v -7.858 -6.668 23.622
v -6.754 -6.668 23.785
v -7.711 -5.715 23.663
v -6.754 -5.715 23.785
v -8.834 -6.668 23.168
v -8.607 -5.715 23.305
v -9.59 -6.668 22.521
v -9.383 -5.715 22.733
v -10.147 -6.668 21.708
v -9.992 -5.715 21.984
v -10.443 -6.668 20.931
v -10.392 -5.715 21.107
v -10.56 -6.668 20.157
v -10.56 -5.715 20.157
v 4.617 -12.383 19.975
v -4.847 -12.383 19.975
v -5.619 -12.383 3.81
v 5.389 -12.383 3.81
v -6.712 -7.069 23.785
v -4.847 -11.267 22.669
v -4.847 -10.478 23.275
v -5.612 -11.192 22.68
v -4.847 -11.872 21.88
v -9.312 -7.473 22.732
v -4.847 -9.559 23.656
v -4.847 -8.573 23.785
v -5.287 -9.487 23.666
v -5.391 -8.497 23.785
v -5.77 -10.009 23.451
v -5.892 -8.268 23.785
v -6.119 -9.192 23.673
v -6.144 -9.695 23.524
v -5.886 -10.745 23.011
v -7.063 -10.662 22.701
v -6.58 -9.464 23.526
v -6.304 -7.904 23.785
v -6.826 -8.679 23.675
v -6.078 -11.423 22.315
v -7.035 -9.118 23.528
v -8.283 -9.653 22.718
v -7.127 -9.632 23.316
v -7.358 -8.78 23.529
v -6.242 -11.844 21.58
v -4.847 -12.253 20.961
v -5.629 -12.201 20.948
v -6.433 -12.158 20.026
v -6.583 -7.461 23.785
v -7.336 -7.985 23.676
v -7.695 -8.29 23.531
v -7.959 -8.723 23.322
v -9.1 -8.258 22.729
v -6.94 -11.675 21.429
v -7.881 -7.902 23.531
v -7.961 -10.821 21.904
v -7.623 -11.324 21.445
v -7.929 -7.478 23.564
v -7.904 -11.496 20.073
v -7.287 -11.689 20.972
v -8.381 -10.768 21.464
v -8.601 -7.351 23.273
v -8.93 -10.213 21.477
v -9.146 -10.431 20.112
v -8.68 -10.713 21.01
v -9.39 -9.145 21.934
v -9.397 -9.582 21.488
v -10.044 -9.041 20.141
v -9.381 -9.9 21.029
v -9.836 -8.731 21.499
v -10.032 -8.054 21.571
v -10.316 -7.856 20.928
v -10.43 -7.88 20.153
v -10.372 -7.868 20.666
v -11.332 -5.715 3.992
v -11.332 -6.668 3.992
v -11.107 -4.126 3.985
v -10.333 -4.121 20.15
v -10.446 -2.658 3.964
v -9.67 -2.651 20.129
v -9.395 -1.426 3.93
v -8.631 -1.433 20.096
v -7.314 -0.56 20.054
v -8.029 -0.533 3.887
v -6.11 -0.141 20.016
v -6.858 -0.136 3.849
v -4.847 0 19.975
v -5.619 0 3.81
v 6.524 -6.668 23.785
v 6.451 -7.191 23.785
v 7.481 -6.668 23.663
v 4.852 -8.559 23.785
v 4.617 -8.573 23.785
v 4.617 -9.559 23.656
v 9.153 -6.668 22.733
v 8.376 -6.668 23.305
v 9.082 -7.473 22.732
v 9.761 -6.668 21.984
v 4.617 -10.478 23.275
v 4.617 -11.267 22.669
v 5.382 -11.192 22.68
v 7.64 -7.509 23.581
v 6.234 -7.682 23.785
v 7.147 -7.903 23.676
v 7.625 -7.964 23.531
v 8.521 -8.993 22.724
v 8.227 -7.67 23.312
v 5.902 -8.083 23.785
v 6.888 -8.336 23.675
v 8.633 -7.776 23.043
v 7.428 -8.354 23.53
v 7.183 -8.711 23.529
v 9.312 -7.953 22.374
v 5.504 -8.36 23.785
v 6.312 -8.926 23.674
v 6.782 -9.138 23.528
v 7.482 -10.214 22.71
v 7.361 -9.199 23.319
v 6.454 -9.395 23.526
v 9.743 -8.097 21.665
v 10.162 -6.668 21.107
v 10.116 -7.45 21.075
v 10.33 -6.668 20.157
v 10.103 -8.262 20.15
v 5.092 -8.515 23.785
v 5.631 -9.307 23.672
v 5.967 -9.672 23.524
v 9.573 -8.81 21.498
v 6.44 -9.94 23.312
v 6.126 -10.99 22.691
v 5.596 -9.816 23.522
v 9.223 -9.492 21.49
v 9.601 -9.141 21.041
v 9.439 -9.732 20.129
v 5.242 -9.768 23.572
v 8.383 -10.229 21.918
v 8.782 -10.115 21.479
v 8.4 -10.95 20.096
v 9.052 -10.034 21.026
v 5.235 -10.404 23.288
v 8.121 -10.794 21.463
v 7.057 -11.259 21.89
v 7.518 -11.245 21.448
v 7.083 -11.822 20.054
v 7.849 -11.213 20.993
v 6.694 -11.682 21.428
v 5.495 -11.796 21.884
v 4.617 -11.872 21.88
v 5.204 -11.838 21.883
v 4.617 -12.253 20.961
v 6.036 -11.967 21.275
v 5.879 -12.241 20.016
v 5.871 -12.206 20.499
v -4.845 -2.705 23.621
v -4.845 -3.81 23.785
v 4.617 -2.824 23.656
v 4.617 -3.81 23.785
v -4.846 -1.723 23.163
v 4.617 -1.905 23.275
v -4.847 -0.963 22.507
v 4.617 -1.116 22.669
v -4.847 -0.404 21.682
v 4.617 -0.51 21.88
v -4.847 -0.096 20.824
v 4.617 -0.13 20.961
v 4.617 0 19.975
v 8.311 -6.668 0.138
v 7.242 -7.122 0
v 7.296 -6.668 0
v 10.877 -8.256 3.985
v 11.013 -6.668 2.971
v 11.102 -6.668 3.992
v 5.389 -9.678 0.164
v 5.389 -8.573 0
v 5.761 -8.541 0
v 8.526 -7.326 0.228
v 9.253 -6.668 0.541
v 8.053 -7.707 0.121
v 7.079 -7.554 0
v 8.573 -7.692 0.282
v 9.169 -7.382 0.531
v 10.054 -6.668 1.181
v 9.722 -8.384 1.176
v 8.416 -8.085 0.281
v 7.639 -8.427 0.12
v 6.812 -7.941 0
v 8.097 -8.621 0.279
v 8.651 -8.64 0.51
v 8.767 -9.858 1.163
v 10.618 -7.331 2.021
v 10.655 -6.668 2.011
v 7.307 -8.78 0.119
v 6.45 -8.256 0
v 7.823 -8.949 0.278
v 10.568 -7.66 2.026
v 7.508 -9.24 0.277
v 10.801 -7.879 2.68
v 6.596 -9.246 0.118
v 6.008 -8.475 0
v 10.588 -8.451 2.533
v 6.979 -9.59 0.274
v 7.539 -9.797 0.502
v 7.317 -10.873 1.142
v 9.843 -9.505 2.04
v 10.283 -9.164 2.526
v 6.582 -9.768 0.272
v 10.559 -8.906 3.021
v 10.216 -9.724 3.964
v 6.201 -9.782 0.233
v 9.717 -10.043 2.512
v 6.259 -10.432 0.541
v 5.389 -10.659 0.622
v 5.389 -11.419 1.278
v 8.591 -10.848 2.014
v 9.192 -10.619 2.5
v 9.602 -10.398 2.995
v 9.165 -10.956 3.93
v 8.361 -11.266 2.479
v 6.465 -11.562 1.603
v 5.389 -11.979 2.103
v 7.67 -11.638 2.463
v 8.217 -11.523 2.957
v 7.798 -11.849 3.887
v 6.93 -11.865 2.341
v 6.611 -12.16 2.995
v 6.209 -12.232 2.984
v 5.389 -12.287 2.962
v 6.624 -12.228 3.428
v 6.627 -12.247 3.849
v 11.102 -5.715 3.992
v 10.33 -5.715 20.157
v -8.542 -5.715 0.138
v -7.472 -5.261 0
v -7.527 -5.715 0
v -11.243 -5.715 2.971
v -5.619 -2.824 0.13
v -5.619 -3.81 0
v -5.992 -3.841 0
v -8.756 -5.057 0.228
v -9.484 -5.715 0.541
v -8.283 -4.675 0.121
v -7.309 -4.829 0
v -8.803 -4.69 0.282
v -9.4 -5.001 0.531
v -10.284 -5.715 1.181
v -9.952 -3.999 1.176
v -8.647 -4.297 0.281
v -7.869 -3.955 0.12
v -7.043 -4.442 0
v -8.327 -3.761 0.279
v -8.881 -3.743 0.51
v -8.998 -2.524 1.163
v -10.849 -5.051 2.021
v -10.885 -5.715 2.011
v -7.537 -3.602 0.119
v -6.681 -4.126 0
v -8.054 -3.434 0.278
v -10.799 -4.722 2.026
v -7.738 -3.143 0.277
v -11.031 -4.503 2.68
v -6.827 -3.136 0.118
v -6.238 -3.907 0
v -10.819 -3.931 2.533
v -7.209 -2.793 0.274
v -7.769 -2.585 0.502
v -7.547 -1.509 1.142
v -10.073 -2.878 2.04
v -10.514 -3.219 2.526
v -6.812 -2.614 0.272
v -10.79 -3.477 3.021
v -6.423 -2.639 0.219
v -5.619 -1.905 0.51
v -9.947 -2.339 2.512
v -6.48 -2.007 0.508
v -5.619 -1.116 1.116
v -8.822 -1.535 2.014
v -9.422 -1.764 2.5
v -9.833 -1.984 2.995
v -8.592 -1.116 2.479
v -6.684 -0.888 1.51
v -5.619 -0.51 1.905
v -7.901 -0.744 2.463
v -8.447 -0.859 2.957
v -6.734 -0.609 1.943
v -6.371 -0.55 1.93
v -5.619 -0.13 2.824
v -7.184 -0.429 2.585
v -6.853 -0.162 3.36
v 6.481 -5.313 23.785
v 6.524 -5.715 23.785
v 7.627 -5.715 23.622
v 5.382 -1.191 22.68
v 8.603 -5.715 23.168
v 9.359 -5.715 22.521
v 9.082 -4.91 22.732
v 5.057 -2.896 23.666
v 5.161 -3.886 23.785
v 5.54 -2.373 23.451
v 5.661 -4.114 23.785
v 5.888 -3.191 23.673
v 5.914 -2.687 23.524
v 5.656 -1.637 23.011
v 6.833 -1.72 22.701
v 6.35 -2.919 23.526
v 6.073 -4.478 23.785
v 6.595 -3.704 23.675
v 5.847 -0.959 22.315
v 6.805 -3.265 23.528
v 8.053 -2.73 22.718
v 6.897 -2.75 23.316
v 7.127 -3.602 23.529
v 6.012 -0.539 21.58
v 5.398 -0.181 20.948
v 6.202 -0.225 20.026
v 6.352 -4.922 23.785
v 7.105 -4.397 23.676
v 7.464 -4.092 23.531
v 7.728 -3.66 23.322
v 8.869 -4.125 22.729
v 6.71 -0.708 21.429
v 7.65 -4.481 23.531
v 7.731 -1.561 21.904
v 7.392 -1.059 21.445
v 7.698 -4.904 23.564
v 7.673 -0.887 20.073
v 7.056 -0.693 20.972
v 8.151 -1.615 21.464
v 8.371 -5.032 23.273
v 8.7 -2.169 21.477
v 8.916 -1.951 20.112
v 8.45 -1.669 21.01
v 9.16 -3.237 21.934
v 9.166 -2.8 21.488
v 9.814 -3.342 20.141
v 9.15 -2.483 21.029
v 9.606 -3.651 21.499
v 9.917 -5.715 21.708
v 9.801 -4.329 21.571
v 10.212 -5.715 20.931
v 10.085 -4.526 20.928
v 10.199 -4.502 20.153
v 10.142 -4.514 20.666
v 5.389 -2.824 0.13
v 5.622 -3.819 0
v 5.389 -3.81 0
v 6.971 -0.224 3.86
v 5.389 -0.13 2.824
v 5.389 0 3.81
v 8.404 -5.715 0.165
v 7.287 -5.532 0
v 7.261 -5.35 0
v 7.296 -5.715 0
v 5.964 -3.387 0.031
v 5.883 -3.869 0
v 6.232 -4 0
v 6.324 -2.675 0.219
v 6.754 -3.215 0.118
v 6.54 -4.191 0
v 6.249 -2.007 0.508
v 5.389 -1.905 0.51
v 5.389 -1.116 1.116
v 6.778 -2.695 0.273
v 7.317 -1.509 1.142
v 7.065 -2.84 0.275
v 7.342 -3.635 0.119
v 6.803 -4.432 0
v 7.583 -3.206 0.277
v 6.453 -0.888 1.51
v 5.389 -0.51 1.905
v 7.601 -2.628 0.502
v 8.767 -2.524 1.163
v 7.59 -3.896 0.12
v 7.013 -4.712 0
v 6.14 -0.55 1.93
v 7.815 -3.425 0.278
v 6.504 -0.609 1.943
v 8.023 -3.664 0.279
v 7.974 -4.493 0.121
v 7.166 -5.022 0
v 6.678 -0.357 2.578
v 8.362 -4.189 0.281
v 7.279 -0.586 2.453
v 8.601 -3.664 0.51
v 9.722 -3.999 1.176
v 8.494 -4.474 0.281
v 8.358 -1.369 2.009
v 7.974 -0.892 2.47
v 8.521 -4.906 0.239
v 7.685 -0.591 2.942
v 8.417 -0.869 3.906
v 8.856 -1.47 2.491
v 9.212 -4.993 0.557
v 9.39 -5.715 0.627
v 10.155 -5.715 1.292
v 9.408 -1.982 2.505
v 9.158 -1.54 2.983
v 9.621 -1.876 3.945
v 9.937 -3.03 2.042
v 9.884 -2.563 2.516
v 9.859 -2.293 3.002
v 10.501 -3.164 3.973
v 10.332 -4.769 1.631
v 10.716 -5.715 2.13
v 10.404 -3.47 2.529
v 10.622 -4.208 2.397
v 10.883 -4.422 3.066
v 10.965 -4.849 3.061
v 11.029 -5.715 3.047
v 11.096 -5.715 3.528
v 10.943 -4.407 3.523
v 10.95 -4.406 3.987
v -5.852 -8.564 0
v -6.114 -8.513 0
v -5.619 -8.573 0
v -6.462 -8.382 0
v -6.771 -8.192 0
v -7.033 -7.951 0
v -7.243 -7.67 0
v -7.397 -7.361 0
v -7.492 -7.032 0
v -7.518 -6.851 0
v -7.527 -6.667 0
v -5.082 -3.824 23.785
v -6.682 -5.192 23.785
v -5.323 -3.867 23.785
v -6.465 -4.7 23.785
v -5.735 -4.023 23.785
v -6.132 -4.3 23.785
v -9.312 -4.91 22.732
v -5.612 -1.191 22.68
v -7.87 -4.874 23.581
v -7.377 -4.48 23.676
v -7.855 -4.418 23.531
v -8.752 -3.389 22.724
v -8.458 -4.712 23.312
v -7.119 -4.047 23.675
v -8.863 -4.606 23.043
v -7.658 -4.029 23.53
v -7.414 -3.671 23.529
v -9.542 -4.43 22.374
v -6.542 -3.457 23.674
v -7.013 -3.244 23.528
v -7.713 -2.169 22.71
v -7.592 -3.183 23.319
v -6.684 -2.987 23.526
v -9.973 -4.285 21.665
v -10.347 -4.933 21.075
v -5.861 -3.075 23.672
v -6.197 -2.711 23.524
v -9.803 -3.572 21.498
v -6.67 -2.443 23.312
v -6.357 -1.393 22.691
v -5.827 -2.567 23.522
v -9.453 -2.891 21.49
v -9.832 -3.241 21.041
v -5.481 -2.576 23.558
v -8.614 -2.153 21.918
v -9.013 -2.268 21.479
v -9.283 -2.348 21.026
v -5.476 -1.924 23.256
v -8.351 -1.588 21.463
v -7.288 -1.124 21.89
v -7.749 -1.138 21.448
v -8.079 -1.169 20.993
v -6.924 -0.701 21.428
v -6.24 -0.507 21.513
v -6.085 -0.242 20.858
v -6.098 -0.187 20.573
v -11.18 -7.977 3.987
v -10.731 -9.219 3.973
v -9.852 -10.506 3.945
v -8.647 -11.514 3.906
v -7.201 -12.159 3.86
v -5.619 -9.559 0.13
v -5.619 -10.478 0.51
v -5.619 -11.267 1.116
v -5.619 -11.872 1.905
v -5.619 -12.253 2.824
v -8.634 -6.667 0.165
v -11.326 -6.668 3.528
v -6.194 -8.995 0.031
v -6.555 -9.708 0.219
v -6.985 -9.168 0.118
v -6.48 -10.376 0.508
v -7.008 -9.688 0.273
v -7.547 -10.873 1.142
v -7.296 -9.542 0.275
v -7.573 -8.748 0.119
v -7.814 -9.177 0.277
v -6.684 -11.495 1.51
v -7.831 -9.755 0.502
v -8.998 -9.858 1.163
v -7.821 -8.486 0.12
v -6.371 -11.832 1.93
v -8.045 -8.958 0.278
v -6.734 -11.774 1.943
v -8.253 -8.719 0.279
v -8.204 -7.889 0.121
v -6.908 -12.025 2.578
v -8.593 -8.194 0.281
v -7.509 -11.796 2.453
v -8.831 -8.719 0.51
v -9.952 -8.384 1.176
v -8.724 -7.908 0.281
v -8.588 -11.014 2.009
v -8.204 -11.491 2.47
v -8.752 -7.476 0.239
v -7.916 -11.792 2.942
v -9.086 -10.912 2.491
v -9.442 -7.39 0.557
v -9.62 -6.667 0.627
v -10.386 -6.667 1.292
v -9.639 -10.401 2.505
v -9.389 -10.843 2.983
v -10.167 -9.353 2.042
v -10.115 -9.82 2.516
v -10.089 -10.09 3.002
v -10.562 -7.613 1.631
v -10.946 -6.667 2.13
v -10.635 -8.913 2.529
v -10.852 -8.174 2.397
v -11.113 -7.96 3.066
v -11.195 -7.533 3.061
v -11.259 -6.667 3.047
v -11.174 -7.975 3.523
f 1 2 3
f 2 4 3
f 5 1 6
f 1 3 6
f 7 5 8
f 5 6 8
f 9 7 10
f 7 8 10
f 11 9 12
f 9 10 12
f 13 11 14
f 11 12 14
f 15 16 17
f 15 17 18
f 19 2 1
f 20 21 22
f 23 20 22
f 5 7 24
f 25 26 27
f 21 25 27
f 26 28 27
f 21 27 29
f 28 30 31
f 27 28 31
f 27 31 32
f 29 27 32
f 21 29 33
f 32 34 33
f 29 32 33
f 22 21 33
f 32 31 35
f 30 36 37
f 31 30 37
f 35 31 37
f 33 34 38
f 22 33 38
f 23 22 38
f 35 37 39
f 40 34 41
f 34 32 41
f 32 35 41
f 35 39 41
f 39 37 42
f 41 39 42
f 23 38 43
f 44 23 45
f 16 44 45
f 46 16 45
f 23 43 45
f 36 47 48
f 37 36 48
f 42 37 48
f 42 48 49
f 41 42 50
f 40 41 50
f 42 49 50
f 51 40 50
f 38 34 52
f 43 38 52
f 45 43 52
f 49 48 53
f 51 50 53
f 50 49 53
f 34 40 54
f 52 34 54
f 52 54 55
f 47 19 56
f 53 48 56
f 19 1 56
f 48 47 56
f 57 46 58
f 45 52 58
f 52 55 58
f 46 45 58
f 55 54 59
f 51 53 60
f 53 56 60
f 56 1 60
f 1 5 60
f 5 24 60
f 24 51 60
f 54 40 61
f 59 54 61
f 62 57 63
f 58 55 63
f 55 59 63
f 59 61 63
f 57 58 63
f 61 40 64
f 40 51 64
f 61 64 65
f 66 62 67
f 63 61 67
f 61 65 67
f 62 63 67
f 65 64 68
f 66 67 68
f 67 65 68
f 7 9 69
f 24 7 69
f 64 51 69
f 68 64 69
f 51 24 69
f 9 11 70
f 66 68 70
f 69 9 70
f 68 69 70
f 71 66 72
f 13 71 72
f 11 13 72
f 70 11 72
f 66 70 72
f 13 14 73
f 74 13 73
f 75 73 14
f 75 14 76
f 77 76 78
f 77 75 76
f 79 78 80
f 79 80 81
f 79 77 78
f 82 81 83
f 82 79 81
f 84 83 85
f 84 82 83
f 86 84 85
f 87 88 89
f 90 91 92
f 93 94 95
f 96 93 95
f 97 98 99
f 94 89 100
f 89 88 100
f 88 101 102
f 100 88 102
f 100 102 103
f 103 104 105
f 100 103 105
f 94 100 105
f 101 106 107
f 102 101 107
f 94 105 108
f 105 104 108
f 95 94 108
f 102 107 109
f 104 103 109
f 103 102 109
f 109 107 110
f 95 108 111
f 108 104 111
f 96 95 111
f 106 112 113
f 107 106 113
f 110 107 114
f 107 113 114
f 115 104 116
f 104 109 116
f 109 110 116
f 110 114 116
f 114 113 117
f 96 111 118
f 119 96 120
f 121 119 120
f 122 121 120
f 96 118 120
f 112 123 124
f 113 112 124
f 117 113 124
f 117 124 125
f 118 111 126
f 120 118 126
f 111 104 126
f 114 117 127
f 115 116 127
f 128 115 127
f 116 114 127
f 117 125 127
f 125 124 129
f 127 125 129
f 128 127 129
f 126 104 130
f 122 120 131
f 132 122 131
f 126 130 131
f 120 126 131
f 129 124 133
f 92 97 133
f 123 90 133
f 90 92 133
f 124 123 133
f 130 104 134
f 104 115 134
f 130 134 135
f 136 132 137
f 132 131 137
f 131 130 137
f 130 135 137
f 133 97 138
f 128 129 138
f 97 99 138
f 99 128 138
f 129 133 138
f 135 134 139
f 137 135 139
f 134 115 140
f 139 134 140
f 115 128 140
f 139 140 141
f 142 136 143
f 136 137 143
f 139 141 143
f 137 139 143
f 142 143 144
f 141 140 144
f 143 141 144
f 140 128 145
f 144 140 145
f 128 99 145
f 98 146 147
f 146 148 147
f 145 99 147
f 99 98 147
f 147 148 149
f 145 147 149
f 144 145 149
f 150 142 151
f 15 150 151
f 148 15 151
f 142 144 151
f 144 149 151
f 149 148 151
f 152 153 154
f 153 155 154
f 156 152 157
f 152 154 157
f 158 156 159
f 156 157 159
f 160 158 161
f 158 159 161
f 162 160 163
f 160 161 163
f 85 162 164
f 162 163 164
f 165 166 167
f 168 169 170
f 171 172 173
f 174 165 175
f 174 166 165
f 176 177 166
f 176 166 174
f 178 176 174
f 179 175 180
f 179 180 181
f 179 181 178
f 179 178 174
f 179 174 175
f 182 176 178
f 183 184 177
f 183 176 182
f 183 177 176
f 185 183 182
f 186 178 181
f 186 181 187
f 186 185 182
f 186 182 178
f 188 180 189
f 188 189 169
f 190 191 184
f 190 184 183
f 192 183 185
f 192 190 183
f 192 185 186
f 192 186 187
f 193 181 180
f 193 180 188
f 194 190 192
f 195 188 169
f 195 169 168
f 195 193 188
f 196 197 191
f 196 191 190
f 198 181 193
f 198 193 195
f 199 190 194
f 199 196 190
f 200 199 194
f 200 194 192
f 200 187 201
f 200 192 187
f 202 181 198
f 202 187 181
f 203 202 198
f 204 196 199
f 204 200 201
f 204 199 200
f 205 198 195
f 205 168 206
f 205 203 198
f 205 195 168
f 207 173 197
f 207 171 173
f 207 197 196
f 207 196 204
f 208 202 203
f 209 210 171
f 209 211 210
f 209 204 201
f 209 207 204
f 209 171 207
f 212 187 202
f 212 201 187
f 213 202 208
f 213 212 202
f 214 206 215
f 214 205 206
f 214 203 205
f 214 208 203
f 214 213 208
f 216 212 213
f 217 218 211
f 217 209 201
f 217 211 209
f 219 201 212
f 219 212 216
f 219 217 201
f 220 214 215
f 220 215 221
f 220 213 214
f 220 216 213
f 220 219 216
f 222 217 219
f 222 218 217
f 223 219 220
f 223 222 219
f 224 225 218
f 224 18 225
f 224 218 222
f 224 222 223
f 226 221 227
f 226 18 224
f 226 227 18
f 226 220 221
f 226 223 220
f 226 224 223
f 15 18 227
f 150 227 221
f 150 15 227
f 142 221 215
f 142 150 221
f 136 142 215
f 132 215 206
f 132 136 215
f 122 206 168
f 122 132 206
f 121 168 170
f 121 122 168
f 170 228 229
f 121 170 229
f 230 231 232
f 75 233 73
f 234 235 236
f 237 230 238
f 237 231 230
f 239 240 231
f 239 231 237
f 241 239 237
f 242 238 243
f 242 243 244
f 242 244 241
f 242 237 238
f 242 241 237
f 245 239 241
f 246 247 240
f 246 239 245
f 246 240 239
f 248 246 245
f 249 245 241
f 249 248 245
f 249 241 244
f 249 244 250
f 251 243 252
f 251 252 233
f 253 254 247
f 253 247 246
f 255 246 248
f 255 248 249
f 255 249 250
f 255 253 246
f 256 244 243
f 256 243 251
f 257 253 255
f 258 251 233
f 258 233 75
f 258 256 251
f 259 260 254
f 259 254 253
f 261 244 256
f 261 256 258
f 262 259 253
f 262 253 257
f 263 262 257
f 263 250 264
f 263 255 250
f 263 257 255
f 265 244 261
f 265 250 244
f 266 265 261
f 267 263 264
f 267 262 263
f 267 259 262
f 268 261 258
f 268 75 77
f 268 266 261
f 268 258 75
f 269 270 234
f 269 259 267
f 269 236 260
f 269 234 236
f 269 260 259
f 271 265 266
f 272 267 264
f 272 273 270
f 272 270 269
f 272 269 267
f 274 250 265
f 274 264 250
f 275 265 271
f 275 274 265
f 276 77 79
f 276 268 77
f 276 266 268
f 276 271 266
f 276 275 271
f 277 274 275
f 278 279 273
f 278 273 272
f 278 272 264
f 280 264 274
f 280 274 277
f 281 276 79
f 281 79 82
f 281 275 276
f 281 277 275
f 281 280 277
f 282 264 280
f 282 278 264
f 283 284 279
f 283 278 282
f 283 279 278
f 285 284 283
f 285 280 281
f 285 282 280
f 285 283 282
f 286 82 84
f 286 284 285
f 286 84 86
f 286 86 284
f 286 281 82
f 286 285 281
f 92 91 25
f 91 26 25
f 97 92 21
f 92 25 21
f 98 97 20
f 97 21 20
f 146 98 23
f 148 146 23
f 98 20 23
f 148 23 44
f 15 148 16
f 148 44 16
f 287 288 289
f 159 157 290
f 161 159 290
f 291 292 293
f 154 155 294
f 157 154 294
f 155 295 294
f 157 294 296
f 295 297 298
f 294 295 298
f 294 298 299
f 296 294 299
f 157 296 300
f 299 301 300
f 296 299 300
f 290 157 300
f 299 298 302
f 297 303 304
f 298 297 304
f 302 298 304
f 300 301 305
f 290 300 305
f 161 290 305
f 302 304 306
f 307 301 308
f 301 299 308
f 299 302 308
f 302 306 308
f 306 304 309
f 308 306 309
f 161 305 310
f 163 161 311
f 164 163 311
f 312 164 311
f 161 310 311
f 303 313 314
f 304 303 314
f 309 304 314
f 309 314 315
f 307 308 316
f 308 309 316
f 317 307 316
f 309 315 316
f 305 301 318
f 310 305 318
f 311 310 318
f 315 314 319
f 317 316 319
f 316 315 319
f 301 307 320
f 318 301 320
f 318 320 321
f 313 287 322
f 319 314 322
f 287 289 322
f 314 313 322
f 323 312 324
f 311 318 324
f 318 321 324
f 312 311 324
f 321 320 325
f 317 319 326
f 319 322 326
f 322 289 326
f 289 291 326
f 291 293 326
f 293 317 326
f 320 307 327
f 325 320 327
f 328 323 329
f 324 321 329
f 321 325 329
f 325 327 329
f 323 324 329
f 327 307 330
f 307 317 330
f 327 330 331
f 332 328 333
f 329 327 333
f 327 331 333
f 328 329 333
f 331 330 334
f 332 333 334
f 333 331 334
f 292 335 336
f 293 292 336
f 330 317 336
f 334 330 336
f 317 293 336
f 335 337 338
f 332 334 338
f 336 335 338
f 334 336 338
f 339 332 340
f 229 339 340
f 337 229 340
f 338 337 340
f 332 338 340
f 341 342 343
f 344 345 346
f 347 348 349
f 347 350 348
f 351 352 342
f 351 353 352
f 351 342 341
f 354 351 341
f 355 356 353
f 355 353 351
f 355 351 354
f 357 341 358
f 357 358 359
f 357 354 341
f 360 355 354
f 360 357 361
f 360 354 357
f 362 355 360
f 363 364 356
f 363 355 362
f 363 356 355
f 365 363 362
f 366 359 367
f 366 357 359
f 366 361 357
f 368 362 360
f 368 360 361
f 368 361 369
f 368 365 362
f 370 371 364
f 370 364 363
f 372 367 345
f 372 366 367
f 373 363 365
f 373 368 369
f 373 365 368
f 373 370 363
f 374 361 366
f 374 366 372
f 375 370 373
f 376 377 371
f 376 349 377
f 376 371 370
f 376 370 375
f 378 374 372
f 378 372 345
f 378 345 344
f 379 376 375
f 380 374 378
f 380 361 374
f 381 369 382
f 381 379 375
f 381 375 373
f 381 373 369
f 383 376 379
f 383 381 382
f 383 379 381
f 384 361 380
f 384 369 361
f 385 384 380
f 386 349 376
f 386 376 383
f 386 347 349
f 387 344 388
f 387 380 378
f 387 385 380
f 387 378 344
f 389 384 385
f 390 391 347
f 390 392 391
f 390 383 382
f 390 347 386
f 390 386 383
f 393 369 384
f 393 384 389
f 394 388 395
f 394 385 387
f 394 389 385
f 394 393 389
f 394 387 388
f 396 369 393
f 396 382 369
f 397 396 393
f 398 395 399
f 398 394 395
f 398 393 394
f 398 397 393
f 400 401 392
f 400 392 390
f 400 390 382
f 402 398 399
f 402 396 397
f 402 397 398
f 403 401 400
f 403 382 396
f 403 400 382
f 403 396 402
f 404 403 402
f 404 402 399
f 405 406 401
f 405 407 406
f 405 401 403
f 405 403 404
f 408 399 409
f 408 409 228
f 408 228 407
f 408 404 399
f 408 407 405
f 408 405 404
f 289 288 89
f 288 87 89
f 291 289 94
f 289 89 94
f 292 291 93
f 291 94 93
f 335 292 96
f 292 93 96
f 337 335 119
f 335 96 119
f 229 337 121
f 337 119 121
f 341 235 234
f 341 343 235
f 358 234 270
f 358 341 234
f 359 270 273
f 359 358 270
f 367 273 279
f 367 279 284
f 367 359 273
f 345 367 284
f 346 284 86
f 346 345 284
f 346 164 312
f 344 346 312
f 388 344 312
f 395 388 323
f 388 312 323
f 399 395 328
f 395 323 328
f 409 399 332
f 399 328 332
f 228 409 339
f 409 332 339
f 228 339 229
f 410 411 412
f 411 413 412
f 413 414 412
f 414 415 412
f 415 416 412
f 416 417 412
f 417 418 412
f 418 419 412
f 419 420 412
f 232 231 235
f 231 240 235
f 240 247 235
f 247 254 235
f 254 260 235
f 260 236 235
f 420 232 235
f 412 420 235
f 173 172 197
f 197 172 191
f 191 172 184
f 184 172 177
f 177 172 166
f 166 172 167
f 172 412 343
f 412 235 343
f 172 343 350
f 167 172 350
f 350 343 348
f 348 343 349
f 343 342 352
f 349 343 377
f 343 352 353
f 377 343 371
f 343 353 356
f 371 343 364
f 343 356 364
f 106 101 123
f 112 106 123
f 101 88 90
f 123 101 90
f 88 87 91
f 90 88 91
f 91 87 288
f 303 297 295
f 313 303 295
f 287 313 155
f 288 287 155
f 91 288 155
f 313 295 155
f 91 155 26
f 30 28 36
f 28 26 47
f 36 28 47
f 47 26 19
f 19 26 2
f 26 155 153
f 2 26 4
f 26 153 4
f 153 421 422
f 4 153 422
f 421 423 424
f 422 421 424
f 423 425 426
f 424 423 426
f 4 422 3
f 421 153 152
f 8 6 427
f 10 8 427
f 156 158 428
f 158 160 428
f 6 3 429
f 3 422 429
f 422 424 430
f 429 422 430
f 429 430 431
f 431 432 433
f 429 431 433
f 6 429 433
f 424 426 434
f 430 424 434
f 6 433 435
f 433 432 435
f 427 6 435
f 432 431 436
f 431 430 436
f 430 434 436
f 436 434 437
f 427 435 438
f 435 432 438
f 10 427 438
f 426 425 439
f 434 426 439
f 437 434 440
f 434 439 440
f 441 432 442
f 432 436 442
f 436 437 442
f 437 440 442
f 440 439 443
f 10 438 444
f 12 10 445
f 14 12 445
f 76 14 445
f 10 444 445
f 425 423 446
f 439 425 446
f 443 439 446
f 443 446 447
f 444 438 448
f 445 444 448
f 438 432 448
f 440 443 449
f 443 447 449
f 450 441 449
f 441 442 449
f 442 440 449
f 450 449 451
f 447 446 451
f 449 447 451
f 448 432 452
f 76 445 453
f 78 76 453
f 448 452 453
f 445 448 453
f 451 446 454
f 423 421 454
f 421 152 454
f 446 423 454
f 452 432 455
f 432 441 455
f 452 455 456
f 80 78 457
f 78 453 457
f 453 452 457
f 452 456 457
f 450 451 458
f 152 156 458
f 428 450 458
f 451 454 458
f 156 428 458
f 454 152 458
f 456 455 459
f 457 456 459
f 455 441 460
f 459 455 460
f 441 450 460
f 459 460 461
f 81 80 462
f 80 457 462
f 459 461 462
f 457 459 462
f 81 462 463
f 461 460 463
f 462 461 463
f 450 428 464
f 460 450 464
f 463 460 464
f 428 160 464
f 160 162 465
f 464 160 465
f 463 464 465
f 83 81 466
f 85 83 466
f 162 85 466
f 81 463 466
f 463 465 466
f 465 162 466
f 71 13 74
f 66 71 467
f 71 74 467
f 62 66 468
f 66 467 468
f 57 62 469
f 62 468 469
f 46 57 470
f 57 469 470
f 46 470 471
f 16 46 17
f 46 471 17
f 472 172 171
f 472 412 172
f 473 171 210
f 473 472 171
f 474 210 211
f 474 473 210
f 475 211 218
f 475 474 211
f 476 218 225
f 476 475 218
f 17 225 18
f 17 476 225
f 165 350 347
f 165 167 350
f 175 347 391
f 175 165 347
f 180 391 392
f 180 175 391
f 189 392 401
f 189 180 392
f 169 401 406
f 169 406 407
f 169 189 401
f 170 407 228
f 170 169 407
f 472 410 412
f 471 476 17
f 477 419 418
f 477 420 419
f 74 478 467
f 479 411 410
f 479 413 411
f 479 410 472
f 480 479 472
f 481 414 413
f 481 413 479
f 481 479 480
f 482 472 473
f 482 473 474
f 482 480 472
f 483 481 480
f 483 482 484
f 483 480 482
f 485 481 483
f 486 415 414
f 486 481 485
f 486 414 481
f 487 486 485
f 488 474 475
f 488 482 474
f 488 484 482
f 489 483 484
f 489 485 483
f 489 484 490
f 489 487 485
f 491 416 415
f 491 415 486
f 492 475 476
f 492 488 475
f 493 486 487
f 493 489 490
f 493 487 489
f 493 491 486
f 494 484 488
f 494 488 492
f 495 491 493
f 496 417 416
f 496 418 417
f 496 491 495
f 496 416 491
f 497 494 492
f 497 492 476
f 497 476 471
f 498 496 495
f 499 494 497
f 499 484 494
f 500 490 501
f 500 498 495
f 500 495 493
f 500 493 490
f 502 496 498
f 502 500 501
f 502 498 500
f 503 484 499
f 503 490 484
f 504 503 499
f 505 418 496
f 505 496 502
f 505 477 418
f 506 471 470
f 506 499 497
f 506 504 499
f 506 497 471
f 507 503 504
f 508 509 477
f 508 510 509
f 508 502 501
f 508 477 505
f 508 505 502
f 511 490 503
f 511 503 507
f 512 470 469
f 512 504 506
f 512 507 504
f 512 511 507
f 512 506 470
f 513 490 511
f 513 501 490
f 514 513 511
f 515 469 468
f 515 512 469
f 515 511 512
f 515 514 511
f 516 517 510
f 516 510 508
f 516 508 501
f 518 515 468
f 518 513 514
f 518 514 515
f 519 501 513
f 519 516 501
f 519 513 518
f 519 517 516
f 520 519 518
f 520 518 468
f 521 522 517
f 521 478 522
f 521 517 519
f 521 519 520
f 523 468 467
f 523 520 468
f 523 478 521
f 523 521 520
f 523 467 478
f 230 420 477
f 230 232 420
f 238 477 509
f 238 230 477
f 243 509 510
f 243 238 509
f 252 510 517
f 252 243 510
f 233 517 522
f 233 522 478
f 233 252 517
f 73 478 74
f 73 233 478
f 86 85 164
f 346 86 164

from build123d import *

# Parameters (mm, degrees)
F1_DEPTH = 16.51
F2_R     = 7.62
F3_R     = 7.62
F4_R     = 5.08
F5_R     = 5.08
F6_SCALE = 0.75


with BuildPart() as f1:
    # F0 (on Front) → F1 (new body)
    with BuildSketch(Plane.XZ):
        Polygon((-13.8489005984, 31.7138343761), (-15.3638953721, 0), (15.0566186512, 0), (13.5416238775, 31.7138343761), align=None)
    extrude(amount=F1_DEPTH)

    # F2
    f2_edges = [f1.edges().sort_by_distance(p)[0] for p in [
        (-14.606398, -16.51, 15.856917),
    ]]
    fillet(f2_edges, radius=F2_R)

    # F3
    f3_edges = [f1.edges().sort_by_distance(p)[0] for p in [
        (14.299121, -16.51, 15.856917),
        (14.299121, 0, 15.856917),
        (-14.606398, 0, 15.856917),
    ]]
    fillet(f3_edges, radius=F3_R)

    # F4
    f4_edges = [f1.edges().sort_by_distance(p)[0] for p in [
        (-0.153638, 0, 0),
    ]]
    fillet(f4_edges, radius=F4_R)

    # F5
    f5_edges = [f1.edges().sort_by_distance(p)[0] for p in [
        (-0.153638, -16.51, 31.713834),
    ]]
    fillet(f5_edges, radius=F5_R)


with BuildPart() as f1_1:
    # F6: moved
    add(f1.part.scale(F6_SCALE))


solid = f1_1.part
